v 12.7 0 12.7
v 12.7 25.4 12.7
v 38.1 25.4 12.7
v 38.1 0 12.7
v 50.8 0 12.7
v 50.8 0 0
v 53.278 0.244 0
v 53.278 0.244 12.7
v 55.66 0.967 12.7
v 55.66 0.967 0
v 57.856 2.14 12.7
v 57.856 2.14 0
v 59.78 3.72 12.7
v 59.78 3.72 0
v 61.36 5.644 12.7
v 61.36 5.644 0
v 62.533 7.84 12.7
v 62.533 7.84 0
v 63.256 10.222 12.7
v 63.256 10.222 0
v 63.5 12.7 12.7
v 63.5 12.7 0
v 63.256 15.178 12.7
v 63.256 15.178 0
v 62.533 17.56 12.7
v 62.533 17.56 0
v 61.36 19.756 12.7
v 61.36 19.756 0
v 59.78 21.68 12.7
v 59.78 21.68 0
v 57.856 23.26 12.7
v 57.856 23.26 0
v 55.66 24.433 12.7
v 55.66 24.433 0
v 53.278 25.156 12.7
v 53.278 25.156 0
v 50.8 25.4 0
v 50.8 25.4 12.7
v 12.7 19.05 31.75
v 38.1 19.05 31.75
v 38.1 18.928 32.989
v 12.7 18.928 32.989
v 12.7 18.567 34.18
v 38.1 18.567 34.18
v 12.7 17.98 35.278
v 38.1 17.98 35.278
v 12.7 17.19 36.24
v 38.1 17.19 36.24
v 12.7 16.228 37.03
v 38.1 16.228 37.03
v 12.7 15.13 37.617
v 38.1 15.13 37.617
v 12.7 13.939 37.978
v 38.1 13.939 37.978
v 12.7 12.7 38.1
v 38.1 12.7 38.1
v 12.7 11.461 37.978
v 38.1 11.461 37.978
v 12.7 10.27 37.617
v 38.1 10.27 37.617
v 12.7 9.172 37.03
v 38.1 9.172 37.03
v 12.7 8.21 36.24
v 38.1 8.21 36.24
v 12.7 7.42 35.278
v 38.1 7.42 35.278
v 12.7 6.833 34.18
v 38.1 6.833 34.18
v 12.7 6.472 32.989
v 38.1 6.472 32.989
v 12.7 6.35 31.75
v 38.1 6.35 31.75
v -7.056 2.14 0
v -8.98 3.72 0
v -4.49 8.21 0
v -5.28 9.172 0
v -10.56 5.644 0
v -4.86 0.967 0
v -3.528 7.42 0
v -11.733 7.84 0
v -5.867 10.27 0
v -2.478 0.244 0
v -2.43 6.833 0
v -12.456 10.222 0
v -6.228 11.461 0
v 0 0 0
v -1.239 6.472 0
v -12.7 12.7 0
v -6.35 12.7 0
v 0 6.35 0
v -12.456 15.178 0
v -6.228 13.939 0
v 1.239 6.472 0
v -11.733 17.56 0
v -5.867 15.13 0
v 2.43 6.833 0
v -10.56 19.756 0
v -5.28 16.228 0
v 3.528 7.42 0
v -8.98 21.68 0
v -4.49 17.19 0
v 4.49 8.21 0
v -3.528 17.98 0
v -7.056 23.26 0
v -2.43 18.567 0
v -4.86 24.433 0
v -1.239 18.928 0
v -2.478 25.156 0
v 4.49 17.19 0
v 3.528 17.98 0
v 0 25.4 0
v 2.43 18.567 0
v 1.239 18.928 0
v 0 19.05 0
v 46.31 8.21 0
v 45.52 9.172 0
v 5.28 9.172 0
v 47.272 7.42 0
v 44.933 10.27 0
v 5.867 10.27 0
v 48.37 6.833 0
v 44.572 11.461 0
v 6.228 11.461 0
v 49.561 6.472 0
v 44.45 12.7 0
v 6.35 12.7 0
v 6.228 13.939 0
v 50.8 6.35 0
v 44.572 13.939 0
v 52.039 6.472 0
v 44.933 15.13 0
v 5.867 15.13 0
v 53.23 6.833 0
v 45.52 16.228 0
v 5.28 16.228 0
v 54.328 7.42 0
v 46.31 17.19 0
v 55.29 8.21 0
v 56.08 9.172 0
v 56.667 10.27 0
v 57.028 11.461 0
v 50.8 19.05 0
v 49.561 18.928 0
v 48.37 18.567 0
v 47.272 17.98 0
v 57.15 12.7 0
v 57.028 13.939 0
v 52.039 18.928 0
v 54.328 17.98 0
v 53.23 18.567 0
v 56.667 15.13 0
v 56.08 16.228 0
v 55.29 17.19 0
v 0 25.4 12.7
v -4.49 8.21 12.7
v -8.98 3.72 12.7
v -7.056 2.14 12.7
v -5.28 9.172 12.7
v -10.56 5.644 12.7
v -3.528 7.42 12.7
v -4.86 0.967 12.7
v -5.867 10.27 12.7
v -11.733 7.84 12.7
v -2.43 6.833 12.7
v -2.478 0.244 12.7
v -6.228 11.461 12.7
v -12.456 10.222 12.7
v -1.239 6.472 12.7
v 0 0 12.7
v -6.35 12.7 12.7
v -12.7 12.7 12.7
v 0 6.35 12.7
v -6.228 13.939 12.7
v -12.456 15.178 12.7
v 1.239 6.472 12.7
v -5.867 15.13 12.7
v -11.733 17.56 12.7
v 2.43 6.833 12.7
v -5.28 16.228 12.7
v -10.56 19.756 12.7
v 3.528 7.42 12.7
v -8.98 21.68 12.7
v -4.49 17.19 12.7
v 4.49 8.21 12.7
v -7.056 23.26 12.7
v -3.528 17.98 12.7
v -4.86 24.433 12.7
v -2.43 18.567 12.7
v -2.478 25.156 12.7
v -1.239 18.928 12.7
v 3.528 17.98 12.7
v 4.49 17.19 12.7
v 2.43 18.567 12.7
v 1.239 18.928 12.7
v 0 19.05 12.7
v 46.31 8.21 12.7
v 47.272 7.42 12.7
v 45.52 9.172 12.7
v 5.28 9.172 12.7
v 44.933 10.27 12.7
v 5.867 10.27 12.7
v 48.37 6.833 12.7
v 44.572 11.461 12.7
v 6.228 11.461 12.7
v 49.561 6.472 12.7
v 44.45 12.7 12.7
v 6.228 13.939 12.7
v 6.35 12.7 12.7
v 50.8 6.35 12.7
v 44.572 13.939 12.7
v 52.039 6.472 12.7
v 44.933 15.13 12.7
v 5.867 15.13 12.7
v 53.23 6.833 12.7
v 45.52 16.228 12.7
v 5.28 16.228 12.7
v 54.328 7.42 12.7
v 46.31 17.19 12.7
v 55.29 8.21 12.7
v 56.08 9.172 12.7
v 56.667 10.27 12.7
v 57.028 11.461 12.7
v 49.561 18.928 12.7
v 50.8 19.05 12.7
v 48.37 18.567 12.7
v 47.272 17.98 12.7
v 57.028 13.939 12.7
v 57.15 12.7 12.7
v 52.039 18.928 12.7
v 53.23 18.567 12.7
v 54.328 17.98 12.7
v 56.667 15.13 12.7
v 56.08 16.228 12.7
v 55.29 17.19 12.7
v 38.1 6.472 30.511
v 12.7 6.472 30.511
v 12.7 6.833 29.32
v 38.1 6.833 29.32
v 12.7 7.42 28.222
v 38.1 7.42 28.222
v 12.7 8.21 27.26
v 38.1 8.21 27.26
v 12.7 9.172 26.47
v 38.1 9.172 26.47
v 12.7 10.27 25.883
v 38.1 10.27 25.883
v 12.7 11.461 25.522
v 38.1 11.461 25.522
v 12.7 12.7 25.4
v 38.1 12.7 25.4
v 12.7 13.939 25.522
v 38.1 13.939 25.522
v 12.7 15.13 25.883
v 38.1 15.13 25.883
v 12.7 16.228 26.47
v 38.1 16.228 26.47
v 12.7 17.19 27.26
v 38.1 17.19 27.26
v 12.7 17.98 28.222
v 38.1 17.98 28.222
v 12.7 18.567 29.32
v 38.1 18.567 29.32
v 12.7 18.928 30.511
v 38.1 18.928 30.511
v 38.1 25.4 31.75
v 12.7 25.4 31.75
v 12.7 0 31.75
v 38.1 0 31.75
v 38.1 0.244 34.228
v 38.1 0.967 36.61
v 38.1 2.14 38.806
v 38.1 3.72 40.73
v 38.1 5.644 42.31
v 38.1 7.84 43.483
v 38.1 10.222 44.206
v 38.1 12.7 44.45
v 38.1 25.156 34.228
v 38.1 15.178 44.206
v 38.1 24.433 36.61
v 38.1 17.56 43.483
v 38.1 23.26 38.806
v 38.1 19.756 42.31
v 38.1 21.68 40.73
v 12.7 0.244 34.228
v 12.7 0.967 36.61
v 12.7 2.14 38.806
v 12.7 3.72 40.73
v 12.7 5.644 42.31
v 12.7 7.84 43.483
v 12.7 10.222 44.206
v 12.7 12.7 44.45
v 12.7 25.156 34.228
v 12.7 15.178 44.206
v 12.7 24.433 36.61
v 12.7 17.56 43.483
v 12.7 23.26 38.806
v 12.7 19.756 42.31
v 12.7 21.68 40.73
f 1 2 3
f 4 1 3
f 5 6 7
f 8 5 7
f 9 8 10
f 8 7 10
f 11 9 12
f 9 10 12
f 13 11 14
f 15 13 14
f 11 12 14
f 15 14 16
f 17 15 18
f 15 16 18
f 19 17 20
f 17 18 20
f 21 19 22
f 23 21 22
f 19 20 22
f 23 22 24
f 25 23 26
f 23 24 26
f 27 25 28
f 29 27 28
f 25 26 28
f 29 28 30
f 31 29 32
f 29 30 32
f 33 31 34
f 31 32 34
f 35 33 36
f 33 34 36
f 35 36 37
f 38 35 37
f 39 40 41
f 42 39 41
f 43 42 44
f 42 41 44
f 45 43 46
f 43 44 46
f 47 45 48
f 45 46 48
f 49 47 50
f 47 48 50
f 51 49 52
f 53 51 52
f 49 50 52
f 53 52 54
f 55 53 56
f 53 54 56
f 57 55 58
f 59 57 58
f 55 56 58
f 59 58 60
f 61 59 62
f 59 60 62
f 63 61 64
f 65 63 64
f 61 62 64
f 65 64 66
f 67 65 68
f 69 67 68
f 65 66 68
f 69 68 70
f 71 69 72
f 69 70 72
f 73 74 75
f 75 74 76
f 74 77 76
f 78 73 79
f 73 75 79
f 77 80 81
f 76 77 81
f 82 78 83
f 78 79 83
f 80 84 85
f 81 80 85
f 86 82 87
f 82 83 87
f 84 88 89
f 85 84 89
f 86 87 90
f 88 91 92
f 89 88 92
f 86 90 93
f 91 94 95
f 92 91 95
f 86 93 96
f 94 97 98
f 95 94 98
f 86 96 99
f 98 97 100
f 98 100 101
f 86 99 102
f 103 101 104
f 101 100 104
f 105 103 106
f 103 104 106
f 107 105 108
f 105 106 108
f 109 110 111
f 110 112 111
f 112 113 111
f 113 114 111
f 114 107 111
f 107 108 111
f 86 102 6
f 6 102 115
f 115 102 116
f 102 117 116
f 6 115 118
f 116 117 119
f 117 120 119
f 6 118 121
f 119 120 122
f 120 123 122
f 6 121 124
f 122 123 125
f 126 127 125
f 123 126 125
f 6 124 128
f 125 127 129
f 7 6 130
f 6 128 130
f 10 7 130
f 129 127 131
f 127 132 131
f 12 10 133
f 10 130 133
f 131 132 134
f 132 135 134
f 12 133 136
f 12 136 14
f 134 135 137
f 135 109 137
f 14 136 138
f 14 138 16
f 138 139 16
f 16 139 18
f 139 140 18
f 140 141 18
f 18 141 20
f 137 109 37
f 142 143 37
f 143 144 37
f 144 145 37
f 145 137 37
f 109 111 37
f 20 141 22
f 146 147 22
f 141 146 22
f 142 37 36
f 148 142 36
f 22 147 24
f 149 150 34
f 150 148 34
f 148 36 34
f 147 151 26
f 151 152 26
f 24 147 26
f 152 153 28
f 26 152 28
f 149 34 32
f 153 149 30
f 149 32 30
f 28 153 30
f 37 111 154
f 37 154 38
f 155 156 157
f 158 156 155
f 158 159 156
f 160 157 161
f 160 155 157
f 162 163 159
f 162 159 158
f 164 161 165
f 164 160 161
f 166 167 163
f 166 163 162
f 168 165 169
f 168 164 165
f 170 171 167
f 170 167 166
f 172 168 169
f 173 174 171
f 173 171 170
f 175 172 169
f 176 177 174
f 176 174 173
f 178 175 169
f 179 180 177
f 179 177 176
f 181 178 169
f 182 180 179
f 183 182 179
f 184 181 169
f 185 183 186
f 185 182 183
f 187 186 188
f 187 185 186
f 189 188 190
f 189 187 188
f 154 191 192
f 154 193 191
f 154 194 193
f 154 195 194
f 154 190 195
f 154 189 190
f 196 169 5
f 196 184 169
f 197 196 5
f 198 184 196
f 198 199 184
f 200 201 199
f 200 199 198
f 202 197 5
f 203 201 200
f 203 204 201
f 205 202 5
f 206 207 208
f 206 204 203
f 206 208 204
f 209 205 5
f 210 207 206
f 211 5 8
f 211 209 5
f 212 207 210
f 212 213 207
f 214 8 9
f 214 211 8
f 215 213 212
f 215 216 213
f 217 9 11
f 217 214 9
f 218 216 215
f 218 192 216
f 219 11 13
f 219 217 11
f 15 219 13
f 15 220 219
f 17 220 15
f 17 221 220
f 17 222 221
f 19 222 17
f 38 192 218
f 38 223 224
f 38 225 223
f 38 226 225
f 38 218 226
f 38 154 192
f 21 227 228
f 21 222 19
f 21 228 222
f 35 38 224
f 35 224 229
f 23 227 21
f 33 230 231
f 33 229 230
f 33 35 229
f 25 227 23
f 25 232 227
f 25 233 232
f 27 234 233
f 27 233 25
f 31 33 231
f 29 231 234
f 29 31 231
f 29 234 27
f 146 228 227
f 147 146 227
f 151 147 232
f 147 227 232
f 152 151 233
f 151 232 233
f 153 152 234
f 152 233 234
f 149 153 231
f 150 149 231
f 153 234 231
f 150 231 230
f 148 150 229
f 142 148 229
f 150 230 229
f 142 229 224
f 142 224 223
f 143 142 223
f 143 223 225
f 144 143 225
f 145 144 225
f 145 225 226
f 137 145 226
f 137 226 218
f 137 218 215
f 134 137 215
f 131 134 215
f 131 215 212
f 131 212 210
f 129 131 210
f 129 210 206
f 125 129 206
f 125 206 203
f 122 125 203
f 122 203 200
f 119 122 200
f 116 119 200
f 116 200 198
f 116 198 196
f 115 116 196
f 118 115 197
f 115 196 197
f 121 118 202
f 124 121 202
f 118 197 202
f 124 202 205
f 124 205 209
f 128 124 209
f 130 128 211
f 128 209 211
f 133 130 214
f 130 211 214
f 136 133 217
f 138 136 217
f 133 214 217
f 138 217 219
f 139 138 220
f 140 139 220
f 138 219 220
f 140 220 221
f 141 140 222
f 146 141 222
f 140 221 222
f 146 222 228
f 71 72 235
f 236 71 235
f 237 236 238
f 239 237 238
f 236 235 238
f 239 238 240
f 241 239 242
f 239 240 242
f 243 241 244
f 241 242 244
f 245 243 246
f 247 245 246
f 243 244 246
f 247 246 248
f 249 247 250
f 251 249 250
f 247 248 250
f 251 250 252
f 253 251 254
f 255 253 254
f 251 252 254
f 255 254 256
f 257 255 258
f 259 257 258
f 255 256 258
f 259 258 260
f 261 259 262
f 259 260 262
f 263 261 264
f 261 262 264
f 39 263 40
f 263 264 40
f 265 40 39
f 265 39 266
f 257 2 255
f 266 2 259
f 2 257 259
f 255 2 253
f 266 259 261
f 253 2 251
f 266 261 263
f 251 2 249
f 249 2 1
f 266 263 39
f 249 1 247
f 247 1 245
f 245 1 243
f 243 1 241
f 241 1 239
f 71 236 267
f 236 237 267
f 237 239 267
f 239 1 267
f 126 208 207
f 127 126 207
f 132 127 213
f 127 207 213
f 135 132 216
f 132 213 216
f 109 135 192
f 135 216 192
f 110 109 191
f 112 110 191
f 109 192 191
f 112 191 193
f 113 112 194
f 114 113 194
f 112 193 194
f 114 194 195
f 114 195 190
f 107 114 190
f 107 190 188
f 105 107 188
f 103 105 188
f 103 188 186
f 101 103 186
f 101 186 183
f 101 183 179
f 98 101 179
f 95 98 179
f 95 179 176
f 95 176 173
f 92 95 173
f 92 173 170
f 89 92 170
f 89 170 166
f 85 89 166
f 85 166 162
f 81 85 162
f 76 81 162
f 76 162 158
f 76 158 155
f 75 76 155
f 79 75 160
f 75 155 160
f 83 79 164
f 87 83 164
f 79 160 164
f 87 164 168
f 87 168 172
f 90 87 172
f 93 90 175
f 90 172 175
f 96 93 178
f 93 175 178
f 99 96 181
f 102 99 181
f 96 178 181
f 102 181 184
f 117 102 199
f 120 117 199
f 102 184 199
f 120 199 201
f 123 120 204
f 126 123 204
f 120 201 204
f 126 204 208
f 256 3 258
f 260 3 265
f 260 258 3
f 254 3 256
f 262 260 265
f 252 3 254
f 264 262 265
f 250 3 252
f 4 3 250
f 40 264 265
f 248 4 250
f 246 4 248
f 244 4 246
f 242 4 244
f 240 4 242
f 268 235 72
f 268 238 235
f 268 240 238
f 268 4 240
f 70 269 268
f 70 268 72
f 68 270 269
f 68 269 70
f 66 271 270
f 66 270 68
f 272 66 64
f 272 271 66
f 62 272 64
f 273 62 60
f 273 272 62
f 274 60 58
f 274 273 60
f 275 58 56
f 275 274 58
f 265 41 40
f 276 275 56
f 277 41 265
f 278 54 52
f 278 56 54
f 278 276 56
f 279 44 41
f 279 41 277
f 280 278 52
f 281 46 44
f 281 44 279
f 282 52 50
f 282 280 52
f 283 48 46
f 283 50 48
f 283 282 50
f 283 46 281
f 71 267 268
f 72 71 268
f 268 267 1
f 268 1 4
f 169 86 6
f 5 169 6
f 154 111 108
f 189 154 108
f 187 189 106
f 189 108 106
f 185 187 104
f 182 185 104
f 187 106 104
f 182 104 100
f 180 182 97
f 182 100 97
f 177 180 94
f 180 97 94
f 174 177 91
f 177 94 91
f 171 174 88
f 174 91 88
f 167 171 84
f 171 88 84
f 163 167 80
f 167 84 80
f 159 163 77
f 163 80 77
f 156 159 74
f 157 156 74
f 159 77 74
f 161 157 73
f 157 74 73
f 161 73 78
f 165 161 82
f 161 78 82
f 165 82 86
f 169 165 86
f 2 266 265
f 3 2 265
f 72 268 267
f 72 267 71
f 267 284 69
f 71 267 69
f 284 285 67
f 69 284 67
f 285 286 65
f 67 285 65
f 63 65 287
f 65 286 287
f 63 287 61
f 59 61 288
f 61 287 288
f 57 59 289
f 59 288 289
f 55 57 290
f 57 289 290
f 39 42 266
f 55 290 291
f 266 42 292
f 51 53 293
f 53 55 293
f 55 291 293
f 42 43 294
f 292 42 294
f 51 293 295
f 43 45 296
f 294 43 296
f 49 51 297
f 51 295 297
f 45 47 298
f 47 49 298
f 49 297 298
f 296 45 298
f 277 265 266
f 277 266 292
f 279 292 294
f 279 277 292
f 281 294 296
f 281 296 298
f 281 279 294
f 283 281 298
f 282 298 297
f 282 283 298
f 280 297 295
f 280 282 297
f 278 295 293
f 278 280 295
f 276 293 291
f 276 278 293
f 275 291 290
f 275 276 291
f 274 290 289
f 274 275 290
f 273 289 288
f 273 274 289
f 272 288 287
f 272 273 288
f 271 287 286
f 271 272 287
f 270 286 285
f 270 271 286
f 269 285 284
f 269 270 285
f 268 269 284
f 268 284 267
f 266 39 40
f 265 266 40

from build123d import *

# Parameters (mm, degrees)
F0_W      = 50.8
F0_H      = 25.4
F1_DEPTH  = 12.7
F2_R      = 6.35
F3_DEPTH  = 25.4
F4_W      = 25.4
F4_H      = 19.05
F5_DEPTH  = 25.4
F7_DEPTH  = 25.4
F9_DEPTH  = 25.4
F11_DEPTH = 25.4


with BuildPart() as f1:
    # F0 (on Top) → F1 (new body)
    with BuildSketch(Plane.XY):
        with BuildLine():
            ThreePointArc((0, 25.4), (-12.7, 12.7), (0, 0))
            Line((0, 0), (0, 25.4))
        make_face()
        with Locations((25.4, 12.7)):
            Rectangle(F0_W, F0_H)
        with BuildLine():
            Line((50.8, 25.4), (50.8, 0))
            ThreePointArc((50.8, 0), (63.5, 12.7), (50.8, 25.4))
        make_face()
    extrude(amount=F1_DEPTH)

    # F2 (on face) → F3 (cut)
    with BuildSketch(Plane.XY.offset(12.7)):
        with Locations((0, 12.7)):
            Circle(F2_R)
        with Locations((50.8, 12.7)):
            Circle(F2_R)
    extrude(amount=-F3_DEPTH, mode=Mode.SUBTRACT)

    # F10 (on face) → F11 (cut)
    with BuildSketch(Plane.YZ.offset(38.1)):
        with BuildLine():
            ThreePointArc((6.35, 31.75), (12.7, 25.4), (19.05, 31.75))
            ThreePointArc((19.05, 31.75), (12.7, 38.1), (6.35, 31.75))
        make_face()
    extrude(amount=-F11_DEPTH, mode=Mode.SUBTRACT)


with BuildPart() as f5:
    # F4 (on face) → F5 (new body)
    with BuildSketch(Plane.XZ):
        with Locations((25.4, 22.225)):
            Rectangle(F4_W, F4_H)
    extrude(amount=-F5_DEPTH)


with BuildPart() as f7:
    # F6 (on face) → F7 (new body)
    with BuildSketch(Plane.YZ.offset(38.1)):
        with BuildLine():
            Line((0, 31.75), (25.4, 31.75))
            ThreePointArc((25.4, 31.75), (12.7, 44.45), (0, 31.75))
        make_face()
    extrude(amount=-F7_DEPTH)


with BuildPart() as f9_tool:
    # F8 (on face) → F9 (new body)
    with BuildSketch(Plane.YZ.offset(38.1)):
        with BuildLine():
            ThreePointArc((6.35, 31.75), (12.7, 25.4), (19.05, 31.75))
            Line((19.05, 31.75), (6.35, 31.75))
        make_face()
        with BuildLine():
            Line((6.35, 31.75), (19.05, 31.75))
            ThreePointArc((19.05, 31.75), (12.7, 38.1), (6.35, 31.75))
        make_face()
    extrude(amount=-F9_DEPTH)


with BuildPart() as f5_1:
    add(f5.part)

    # F9: cut by f9_tool
    add(f9_tool.part, mode=Mode.SUBTRACT)


with BuildPart() as f7_1:
    add(f7.part)

    # F9: cut by f9_tool
    add(f9_tool.part, mode=Mode.SUBTRACT)


solid = Compound([f1.part, f5_1.part, f7_1.part])
